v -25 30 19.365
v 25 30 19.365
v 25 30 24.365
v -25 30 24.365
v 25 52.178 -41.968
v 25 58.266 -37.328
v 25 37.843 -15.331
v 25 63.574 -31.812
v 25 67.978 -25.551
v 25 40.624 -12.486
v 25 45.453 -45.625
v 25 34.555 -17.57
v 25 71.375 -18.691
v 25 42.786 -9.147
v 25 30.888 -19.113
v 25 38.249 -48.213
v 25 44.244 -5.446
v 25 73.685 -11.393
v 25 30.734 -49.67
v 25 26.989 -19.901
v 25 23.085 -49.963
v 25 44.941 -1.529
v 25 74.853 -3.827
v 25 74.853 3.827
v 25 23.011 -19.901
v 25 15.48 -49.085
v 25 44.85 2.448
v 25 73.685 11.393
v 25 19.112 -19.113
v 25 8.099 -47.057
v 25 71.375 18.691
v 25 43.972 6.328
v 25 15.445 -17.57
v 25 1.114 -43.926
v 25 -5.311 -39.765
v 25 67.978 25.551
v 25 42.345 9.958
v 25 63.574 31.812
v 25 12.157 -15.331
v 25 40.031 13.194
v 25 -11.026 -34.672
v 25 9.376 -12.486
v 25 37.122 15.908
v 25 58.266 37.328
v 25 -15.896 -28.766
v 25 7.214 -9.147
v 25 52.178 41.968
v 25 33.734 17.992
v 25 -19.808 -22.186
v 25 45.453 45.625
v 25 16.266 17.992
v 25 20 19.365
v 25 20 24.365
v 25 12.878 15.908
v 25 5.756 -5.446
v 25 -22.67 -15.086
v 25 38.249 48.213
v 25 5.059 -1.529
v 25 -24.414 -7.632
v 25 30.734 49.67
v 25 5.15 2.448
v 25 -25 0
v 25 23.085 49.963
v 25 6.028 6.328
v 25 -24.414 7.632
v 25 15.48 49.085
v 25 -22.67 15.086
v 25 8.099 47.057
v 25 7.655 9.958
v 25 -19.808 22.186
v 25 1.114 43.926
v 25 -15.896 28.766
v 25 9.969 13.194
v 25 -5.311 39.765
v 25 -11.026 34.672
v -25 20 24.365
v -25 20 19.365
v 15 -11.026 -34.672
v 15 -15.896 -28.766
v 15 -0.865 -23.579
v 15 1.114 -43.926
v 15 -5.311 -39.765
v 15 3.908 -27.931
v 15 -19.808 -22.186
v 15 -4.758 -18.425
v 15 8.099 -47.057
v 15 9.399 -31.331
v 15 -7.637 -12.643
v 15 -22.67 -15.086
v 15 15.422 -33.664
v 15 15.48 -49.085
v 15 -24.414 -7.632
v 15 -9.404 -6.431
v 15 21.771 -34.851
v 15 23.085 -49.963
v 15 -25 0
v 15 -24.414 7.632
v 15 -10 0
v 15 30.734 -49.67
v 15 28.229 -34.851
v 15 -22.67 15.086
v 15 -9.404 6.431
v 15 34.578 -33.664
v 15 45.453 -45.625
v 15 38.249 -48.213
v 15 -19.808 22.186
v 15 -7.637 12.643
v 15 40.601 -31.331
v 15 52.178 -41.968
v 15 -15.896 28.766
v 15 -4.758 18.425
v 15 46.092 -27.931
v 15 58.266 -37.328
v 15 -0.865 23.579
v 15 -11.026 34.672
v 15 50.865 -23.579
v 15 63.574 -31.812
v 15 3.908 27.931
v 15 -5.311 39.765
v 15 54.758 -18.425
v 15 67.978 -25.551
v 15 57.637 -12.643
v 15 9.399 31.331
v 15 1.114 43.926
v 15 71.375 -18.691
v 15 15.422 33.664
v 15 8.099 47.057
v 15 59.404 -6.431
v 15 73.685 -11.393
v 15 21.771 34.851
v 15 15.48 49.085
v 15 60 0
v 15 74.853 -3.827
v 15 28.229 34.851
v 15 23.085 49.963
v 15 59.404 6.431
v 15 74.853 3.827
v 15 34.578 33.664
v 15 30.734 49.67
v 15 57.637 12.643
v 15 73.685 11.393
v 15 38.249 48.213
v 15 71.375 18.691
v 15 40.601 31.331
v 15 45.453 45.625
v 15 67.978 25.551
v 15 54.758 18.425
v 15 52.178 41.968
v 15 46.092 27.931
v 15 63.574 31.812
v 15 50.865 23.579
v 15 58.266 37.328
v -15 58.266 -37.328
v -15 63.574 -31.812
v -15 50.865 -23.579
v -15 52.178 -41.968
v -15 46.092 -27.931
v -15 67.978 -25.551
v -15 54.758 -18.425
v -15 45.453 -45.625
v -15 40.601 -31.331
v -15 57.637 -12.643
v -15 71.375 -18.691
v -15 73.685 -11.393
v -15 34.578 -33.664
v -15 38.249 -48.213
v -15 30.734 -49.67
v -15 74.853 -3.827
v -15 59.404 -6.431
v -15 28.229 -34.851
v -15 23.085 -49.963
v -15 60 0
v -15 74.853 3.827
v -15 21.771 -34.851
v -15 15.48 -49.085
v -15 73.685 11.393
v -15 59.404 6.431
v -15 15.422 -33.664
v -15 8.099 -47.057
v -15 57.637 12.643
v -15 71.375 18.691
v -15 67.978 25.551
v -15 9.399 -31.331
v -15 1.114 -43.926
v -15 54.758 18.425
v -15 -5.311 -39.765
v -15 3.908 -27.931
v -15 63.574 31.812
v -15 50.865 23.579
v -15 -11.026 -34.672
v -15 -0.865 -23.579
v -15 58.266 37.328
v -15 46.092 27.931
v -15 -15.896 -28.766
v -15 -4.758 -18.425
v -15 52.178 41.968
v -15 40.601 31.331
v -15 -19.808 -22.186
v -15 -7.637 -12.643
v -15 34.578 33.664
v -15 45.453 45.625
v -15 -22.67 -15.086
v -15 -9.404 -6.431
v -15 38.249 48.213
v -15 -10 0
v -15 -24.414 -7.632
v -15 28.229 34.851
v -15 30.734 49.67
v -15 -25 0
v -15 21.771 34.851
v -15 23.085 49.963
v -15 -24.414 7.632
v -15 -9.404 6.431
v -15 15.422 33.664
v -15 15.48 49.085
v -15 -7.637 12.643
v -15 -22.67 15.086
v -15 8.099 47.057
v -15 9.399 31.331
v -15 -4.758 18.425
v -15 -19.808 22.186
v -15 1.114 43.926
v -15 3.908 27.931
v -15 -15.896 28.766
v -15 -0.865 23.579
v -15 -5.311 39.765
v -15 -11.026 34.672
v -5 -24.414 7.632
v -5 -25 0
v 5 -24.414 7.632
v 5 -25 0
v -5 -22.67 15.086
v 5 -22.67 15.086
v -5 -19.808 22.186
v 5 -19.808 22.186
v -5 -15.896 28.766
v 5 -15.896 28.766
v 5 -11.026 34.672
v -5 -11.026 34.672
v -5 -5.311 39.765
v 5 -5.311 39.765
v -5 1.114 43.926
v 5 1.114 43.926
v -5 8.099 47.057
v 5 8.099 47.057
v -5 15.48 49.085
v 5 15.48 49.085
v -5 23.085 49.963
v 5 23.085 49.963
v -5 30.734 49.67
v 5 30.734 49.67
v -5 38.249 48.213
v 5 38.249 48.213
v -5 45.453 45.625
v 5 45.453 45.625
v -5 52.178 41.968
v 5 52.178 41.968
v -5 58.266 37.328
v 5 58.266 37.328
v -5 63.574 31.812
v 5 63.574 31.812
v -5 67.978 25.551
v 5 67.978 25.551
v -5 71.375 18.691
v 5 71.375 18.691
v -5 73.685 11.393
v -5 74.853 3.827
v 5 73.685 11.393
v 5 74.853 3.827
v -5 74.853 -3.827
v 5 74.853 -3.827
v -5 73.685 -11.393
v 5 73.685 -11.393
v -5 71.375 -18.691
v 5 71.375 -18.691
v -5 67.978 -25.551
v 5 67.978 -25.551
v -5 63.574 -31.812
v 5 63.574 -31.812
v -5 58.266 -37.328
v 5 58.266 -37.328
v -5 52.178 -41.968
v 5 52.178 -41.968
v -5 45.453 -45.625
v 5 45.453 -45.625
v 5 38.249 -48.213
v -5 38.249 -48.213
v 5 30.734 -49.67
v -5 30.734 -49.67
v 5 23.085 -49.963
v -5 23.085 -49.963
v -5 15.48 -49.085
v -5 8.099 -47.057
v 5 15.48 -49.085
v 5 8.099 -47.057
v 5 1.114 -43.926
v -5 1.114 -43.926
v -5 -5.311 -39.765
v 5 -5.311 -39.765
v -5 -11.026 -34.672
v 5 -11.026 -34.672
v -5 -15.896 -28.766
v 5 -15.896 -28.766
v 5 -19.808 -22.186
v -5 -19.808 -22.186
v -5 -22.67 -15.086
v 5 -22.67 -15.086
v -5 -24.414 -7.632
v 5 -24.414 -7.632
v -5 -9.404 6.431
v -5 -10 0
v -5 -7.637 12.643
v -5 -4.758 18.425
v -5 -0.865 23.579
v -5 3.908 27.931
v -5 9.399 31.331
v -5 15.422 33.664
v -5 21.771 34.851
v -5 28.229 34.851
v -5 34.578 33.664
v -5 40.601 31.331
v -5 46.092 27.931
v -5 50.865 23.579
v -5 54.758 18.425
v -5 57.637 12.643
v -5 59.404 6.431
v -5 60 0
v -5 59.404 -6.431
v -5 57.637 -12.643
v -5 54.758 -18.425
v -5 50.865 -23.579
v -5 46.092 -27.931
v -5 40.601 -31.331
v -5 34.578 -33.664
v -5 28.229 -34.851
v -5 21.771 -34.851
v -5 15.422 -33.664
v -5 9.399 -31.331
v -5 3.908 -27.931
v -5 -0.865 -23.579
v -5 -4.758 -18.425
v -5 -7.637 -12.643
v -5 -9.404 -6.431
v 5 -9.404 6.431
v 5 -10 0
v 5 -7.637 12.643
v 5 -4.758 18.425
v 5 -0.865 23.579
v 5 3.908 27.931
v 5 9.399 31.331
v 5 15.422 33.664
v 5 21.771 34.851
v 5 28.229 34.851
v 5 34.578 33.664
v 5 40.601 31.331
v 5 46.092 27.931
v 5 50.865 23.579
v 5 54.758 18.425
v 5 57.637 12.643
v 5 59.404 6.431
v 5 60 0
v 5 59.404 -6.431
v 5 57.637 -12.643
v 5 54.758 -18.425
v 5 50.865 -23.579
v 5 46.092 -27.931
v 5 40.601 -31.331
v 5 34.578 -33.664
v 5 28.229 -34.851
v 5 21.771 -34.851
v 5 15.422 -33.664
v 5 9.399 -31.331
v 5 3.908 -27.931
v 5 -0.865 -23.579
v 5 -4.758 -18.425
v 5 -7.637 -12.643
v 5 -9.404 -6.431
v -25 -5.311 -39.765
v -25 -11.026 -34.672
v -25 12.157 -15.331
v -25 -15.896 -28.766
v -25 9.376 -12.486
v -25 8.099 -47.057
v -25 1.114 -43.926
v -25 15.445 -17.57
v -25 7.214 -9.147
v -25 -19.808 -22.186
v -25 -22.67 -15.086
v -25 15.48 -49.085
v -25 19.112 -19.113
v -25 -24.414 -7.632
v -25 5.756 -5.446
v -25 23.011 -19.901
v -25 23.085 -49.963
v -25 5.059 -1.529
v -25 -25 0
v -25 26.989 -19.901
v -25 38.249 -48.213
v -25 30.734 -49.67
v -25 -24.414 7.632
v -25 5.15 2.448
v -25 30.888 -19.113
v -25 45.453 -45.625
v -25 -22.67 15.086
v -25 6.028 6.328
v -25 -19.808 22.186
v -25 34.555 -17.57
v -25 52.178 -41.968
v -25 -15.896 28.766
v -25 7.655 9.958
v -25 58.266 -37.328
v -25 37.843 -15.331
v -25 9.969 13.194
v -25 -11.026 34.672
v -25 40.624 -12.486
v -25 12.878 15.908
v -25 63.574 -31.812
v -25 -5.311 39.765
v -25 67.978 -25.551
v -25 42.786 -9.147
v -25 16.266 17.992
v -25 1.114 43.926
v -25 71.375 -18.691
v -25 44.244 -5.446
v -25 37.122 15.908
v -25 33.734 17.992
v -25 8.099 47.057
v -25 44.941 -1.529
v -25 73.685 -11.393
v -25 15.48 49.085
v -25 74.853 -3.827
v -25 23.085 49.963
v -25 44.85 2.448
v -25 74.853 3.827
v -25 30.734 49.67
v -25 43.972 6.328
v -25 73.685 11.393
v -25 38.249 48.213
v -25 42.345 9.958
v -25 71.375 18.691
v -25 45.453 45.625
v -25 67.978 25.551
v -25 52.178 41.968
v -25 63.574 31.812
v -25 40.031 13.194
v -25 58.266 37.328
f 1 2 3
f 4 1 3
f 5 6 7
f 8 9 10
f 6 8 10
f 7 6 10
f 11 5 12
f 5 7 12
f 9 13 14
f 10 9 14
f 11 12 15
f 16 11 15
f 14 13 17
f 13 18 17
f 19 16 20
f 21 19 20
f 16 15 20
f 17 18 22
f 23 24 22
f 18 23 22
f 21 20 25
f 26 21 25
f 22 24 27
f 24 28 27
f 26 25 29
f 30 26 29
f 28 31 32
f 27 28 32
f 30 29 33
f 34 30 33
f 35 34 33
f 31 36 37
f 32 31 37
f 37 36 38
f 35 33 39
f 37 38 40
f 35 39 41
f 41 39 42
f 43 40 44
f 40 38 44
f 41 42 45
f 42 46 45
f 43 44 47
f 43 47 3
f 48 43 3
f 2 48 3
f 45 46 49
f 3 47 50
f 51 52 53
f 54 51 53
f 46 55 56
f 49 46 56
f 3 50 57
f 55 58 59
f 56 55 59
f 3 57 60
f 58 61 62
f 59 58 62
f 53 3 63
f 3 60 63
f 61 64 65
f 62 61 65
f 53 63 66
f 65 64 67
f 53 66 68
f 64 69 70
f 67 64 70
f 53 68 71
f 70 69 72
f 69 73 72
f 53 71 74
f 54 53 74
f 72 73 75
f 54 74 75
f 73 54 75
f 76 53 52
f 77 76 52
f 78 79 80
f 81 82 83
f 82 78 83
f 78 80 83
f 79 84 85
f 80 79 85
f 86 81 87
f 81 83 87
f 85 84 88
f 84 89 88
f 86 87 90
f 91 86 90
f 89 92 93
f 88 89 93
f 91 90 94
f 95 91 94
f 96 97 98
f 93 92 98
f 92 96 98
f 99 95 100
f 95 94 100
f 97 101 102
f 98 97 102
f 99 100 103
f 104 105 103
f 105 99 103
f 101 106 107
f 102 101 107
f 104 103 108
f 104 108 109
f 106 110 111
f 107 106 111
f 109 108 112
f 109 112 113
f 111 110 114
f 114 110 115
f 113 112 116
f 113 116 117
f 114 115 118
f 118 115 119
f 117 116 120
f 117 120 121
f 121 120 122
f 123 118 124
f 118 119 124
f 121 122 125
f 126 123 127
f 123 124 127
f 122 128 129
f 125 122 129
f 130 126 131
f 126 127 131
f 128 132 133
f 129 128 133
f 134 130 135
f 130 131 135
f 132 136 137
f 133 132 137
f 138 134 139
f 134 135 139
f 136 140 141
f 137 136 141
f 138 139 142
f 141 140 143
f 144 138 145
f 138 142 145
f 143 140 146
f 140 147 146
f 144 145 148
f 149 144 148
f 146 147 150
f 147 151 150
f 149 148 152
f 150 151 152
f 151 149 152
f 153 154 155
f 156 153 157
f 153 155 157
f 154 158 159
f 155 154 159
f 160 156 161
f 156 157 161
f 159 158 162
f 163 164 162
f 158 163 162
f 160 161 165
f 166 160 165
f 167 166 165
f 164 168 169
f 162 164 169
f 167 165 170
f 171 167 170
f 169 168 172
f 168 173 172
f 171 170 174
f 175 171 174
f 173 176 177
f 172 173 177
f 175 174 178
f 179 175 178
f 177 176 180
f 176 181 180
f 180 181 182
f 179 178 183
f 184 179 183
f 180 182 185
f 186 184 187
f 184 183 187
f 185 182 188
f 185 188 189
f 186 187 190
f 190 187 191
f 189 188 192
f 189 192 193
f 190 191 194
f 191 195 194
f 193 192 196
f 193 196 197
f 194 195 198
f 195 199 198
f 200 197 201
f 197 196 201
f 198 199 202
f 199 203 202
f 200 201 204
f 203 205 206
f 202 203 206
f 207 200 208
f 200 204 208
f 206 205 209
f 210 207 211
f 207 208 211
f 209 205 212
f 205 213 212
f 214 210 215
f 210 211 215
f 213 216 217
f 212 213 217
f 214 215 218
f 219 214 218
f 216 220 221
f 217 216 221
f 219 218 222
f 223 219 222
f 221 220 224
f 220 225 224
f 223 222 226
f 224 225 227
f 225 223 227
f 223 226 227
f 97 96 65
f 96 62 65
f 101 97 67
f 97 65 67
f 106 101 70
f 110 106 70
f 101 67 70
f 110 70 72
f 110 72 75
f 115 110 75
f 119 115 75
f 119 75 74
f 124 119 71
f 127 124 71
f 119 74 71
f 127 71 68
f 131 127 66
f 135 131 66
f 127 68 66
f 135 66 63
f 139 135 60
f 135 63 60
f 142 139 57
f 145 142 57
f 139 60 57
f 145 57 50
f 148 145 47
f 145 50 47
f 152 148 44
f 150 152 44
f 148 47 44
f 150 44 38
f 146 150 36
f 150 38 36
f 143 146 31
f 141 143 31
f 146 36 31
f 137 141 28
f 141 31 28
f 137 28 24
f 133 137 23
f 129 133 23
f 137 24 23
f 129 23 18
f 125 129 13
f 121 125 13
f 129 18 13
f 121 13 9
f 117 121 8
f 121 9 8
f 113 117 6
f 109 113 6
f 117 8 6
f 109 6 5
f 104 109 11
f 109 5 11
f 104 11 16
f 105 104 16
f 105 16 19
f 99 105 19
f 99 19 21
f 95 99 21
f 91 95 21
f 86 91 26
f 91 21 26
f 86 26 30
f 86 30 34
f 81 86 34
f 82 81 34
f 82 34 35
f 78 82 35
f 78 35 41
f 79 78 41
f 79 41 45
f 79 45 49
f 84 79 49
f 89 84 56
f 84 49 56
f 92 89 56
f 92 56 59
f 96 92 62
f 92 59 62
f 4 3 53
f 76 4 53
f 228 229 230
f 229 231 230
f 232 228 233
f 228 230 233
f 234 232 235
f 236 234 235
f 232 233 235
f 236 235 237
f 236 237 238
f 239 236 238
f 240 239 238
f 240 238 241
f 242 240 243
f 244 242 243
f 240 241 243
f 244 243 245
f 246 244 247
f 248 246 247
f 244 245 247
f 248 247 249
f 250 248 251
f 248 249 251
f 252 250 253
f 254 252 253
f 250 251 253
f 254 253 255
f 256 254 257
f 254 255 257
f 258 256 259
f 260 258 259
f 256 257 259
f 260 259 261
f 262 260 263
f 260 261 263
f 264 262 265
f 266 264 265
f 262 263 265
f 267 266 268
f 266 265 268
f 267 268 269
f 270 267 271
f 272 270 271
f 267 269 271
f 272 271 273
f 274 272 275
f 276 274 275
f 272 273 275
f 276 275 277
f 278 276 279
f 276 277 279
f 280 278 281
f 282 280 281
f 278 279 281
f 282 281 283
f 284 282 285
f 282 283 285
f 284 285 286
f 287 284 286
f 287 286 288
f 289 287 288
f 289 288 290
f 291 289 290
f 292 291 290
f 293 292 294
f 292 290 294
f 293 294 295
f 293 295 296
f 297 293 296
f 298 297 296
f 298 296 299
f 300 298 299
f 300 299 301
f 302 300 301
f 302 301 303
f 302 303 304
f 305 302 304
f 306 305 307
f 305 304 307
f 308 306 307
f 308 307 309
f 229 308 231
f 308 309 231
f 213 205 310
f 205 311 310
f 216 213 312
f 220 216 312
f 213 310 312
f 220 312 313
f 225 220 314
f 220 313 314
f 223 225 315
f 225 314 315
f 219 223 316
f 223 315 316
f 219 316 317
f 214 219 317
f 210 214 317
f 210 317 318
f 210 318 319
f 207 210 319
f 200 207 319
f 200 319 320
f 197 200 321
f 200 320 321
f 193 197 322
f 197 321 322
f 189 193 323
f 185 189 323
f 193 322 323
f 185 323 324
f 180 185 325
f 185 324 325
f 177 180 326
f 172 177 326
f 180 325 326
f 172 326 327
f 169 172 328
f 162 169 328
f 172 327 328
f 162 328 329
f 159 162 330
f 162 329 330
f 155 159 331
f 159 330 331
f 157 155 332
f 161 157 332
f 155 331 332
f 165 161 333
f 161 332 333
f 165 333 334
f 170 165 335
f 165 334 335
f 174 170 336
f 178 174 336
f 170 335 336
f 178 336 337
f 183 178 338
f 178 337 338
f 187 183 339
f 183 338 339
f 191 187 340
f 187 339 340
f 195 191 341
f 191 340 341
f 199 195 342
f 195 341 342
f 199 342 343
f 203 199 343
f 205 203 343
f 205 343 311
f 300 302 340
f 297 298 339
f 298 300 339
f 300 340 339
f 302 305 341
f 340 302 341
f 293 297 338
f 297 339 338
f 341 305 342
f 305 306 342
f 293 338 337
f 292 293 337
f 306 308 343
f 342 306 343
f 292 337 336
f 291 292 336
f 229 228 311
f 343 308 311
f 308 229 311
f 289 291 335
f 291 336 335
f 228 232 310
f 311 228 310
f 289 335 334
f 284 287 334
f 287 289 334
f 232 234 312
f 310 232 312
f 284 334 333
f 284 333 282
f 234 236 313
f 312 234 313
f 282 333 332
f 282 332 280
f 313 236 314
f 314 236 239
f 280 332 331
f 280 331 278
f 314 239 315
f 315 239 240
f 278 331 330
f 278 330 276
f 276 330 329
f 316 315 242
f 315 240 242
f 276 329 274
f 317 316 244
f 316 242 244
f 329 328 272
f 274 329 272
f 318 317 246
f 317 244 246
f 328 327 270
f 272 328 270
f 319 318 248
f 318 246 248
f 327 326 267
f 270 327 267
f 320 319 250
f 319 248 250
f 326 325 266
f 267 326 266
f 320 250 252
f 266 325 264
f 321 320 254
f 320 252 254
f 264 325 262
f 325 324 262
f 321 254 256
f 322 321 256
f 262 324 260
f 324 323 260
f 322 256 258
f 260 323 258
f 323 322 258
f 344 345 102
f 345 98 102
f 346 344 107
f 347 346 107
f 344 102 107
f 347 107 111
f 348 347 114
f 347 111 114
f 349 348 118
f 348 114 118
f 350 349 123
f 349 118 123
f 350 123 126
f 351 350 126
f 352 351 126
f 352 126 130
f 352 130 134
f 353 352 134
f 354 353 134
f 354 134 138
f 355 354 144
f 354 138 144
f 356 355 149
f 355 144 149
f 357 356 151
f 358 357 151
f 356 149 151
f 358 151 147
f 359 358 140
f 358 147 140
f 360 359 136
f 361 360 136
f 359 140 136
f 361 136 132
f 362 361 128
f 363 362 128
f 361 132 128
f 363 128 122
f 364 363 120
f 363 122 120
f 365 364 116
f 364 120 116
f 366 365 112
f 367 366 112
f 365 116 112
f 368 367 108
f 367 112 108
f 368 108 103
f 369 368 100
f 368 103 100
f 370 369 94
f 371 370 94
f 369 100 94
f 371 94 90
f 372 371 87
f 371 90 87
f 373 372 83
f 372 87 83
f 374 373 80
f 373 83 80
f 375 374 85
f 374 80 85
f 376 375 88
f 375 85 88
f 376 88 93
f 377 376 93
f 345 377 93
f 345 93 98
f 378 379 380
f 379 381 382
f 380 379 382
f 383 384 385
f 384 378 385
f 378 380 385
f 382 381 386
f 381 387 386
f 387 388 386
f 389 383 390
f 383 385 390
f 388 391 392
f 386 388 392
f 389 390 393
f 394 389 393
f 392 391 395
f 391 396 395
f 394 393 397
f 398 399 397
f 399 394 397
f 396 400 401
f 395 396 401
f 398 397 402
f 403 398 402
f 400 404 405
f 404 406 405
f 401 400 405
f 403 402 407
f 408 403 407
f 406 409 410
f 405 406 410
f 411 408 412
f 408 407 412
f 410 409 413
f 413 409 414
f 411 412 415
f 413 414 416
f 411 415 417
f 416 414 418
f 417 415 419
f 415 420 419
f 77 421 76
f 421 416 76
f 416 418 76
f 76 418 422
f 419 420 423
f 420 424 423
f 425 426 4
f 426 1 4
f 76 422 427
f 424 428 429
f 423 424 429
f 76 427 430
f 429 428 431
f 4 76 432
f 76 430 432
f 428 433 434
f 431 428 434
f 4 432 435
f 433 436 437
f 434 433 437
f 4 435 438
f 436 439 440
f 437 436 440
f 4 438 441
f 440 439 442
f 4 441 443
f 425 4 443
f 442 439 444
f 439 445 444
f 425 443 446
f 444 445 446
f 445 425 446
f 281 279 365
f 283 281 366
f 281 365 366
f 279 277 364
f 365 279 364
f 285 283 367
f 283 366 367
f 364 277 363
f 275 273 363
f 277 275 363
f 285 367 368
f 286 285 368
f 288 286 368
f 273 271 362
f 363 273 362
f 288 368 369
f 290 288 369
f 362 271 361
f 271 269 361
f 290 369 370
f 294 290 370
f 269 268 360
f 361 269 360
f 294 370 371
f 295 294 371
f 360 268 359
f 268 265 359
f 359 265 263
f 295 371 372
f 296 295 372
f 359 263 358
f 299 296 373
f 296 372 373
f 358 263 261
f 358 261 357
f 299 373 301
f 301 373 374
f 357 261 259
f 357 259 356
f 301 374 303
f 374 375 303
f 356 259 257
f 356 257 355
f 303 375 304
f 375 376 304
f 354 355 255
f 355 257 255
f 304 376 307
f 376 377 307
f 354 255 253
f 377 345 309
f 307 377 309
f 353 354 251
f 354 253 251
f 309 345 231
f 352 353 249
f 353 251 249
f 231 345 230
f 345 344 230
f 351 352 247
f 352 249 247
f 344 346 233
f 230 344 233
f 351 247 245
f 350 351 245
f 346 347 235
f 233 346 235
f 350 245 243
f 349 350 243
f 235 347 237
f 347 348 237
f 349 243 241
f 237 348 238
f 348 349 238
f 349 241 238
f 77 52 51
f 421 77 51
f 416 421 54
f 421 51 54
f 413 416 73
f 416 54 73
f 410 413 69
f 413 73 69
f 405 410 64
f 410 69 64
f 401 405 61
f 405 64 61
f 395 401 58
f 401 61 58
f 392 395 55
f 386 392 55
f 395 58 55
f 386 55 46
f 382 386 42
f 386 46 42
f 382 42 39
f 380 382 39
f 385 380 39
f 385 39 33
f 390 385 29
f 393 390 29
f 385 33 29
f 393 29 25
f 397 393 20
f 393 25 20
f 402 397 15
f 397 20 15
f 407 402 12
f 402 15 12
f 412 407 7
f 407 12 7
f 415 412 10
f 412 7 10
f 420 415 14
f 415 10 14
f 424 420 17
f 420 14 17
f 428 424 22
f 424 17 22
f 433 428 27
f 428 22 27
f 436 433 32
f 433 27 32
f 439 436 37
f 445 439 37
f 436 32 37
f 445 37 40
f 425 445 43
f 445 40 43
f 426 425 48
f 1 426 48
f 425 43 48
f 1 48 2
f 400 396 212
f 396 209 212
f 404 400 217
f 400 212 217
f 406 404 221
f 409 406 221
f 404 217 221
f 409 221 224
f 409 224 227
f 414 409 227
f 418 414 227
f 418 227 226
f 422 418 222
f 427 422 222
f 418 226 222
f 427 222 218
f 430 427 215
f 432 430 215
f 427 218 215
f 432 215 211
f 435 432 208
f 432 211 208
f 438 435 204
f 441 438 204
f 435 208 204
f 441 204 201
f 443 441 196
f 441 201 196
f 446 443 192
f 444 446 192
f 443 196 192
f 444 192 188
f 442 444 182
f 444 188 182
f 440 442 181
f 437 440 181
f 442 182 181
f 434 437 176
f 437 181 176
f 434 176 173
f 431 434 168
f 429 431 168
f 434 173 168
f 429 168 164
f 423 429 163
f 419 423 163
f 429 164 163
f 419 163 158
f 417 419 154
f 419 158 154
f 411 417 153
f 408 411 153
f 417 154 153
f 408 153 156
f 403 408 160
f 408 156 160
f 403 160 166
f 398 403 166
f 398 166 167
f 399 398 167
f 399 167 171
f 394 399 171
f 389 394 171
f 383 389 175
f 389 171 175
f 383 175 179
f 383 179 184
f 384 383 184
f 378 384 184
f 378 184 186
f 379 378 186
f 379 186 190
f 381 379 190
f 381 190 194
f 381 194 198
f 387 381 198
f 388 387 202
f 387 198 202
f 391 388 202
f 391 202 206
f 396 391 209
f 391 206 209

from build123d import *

# Parameters (mm, degrees)
F3_DEPTH = 50


with BuildPart() as f1:
    # F0 (on Top) → F1 (revolve)
    with BuildSketch(Plane.XY):
        Polygon((15, -25), (25, -25), (25, 25), (-25, 25), (-25, -25), (-15, -25), (-15, -10), (-5, -10), (-5, -25), (5, -25), (5, -10), (15, -10), align=None)
    revolve(axis=Axis((0, 25, 0), (-1, 0, 0)))

    # F2 (on face) → F3 (cut)
    with BuildSketch(Plane.YZ.offset(25)):
        with BuildLine():
            Line((20, 24.364917), (20, 19.364917))
            ThreePointArc((20, 19.364917), (25, -20), (30, 19.364917))
            Line((30, 19.364917), (30, 24.364917))
            Line((30, 24.364917), (25, 24.364917))
            Line((25, 24.364917), (20, 24.364917))
        make_face()
    extrude(amount=-F3_DEPTH, mode=Mode.SUBTRACT)


solid = f1.part
